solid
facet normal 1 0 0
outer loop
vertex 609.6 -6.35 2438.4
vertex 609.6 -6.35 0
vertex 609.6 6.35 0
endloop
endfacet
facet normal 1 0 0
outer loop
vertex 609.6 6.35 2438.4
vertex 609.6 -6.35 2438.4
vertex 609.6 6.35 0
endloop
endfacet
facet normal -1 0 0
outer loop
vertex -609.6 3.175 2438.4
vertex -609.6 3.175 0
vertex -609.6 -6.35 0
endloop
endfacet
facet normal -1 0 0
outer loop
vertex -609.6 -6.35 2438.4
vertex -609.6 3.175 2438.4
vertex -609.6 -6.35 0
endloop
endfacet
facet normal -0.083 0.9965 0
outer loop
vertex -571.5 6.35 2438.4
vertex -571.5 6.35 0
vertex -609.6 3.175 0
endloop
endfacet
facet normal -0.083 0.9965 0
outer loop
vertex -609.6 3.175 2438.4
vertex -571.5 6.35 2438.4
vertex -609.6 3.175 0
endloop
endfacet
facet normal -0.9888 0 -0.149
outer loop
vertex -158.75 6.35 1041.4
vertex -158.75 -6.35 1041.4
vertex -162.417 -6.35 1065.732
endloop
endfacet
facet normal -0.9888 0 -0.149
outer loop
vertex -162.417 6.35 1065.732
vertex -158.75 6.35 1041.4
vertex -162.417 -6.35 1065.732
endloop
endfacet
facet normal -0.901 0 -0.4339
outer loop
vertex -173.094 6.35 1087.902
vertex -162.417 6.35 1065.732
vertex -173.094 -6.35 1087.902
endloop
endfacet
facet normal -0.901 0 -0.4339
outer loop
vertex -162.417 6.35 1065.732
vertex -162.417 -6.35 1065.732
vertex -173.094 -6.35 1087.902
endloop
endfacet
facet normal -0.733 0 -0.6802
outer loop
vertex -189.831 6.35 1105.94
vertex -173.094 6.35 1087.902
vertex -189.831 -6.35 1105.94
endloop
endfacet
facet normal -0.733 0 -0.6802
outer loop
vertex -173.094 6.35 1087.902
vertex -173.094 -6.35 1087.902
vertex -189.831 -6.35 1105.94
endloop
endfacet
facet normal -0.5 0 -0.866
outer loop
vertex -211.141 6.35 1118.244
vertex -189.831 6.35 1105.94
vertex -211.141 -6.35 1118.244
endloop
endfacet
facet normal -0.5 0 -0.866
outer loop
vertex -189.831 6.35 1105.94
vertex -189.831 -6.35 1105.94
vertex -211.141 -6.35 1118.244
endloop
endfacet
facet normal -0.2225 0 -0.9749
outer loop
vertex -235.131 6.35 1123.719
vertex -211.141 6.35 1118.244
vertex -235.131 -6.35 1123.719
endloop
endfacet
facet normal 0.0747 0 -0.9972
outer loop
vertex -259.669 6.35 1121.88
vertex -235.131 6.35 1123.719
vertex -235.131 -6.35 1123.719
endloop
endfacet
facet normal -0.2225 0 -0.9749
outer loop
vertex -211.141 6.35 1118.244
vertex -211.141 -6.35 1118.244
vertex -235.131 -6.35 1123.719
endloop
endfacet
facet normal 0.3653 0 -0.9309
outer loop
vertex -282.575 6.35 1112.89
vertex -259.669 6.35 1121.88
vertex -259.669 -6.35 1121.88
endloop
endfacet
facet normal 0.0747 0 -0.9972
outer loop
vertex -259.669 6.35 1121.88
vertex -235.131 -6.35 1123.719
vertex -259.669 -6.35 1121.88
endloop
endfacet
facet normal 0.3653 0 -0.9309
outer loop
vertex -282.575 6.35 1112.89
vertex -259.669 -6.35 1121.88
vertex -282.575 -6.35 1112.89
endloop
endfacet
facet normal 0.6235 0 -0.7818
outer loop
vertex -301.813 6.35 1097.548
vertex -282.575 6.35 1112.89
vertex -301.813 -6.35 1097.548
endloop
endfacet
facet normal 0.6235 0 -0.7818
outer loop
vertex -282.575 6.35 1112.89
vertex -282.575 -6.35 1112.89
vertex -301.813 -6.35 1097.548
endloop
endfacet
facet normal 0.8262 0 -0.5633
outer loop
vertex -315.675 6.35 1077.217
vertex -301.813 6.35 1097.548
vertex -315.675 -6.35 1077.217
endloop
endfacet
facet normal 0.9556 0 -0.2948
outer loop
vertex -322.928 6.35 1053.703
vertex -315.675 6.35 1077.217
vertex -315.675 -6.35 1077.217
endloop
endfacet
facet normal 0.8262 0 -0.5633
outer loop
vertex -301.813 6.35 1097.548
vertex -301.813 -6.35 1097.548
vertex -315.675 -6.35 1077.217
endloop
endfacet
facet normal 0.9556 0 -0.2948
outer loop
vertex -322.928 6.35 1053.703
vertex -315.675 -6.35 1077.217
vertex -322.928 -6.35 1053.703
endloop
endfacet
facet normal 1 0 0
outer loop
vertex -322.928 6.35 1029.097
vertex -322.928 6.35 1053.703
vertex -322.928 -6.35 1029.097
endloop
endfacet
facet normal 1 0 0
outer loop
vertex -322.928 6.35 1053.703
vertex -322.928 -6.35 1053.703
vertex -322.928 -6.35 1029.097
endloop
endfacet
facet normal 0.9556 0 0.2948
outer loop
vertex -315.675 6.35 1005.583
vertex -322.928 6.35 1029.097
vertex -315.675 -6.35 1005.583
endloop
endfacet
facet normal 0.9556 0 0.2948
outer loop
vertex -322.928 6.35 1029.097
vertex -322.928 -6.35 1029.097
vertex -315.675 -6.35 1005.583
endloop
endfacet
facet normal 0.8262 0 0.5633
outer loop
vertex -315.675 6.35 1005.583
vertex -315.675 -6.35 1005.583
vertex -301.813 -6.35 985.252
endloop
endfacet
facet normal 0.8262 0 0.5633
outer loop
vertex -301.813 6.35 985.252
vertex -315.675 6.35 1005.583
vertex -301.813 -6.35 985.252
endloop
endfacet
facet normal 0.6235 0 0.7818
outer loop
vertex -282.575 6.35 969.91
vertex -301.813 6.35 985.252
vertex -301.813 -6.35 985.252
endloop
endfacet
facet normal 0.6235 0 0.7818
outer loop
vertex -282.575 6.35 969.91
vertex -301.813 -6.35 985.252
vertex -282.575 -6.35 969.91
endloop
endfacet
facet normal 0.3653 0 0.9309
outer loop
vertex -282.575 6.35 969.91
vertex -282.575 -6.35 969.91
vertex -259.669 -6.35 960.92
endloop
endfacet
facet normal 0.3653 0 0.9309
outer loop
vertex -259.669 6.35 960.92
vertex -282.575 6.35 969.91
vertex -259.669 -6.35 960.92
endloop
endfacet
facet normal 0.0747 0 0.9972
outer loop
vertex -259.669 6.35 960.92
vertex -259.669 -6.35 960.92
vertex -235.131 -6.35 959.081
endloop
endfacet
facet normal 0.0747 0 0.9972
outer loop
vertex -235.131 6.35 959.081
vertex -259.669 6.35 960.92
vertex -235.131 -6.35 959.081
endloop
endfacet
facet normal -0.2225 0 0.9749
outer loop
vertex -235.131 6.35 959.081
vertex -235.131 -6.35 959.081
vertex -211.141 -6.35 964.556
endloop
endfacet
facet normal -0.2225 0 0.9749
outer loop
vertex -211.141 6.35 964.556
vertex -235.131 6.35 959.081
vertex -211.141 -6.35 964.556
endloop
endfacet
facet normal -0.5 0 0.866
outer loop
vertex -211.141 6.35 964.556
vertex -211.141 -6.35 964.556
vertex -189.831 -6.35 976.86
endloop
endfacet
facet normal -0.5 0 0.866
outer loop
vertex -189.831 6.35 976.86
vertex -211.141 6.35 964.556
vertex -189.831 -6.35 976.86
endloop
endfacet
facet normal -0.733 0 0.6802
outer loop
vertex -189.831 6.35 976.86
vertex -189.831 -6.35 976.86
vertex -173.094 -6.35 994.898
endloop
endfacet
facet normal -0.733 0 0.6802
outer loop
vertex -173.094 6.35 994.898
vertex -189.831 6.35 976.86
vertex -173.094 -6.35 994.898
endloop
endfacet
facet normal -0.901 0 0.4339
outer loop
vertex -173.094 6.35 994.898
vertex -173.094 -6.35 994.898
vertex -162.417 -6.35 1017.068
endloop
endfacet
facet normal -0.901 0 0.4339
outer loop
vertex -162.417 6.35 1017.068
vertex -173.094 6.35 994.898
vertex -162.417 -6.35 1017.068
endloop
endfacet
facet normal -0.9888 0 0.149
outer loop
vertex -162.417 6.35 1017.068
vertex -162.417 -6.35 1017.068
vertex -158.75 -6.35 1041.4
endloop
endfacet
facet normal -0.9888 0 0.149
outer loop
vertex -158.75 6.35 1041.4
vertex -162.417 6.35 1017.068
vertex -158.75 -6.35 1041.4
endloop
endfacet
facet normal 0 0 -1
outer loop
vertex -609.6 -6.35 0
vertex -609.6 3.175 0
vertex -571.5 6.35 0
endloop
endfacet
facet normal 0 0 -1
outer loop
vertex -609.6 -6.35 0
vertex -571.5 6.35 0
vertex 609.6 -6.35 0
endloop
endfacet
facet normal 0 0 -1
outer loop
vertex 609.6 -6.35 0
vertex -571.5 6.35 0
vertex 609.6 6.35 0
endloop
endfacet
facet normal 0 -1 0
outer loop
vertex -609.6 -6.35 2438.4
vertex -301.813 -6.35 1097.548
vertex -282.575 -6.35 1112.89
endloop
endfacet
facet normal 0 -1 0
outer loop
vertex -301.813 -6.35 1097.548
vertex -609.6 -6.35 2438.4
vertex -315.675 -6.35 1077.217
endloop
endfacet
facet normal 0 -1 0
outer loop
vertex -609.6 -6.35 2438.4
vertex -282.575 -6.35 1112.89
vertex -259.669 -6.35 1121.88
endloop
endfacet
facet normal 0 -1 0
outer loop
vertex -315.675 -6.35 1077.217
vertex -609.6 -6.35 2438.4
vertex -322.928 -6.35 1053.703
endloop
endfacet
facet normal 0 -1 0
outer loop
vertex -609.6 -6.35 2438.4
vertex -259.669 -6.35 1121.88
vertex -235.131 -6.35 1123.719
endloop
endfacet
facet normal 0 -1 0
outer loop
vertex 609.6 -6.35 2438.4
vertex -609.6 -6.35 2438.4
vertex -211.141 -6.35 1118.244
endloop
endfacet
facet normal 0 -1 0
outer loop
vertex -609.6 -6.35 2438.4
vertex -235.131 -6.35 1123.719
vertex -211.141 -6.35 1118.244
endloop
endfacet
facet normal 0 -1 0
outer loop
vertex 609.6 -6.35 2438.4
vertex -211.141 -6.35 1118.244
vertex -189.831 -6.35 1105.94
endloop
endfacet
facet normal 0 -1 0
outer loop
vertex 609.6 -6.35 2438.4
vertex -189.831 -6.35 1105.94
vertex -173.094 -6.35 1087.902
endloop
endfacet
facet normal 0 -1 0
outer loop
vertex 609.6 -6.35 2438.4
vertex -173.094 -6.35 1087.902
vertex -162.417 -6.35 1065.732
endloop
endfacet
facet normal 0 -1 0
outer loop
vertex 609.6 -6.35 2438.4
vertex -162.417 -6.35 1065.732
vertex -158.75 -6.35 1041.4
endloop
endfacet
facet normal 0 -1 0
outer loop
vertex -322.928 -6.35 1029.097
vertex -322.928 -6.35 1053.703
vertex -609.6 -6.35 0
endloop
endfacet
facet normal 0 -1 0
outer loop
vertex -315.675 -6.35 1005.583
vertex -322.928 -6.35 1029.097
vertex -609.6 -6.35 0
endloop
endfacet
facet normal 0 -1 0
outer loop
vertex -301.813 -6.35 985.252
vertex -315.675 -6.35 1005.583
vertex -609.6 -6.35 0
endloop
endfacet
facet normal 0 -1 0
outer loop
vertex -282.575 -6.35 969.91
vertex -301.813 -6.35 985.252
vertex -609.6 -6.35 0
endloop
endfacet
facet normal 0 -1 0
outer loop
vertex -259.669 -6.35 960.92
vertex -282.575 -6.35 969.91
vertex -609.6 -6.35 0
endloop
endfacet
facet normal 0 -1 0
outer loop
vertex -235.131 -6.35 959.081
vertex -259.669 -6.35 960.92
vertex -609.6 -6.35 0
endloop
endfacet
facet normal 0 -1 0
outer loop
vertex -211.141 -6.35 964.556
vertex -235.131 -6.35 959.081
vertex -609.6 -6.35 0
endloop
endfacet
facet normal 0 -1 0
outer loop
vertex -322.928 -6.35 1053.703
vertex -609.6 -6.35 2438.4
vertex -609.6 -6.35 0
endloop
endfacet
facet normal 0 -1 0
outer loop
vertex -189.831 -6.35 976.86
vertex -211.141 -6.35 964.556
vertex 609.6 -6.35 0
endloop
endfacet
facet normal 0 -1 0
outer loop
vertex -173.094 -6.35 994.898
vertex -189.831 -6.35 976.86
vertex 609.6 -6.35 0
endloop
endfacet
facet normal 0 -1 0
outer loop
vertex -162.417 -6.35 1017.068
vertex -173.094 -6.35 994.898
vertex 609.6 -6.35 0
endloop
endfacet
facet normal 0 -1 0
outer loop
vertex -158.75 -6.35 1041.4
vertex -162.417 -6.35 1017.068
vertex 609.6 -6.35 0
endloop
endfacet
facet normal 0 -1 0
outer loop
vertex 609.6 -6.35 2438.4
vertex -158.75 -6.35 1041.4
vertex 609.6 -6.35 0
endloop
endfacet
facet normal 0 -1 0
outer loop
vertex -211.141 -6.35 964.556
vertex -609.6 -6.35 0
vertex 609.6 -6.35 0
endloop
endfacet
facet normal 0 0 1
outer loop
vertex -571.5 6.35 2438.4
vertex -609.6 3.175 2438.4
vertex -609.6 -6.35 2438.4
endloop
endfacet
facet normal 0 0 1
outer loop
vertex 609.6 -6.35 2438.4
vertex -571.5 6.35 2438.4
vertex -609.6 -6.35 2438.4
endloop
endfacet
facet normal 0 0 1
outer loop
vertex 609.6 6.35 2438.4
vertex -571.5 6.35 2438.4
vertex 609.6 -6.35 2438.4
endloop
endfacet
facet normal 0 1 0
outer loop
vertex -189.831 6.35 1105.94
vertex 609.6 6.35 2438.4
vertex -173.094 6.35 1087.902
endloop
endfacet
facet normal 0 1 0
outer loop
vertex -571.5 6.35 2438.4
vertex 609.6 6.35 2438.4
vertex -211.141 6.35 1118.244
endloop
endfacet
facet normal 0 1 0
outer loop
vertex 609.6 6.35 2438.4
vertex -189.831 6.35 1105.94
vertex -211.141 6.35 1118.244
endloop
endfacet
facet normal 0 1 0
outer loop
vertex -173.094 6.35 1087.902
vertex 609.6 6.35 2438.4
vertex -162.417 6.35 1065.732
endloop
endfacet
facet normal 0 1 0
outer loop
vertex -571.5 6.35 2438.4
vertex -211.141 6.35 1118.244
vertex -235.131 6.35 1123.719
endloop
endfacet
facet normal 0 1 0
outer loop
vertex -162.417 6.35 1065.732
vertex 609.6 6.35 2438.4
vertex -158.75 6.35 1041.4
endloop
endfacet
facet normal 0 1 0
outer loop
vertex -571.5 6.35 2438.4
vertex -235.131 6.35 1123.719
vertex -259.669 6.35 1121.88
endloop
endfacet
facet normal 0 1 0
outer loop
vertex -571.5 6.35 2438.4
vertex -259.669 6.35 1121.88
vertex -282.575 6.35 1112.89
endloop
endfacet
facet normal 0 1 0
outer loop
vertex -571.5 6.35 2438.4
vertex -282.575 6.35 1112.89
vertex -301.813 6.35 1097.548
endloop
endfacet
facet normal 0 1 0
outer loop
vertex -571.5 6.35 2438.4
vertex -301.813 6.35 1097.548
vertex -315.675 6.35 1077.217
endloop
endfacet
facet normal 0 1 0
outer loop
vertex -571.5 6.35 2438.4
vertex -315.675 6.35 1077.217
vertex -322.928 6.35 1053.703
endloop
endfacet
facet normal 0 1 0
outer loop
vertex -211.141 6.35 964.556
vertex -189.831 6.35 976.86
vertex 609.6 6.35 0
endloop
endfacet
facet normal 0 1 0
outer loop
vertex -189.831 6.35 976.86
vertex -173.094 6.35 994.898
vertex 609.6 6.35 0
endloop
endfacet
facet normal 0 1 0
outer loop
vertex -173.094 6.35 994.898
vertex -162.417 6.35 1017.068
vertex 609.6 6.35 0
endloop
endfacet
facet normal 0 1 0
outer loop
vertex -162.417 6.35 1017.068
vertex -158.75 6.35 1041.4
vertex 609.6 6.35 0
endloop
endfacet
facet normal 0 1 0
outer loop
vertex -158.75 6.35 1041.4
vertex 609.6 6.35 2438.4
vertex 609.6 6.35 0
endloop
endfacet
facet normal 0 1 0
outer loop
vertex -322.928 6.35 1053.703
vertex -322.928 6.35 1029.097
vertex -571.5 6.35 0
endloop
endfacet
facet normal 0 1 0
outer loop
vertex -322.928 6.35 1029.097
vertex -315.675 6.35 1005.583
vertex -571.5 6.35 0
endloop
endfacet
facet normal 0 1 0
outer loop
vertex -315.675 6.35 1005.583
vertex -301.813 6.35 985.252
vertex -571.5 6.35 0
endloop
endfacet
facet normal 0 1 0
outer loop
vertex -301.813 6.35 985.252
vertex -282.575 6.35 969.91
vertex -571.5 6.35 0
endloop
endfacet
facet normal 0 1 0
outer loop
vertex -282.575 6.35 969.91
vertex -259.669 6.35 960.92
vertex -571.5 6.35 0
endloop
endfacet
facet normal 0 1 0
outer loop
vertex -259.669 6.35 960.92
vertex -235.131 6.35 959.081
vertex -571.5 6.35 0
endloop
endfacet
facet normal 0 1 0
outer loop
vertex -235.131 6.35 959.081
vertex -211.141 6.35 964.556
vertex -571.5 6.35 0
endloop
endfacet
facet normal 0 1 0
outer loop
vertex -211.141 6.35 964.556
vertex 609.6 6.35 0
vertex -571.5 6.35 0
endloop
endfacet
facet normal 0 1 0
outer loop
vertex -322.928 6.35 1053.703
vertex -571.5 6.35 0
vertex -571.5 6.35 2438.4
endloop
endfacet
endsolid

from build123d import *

# Parameters (mm, degrees)
F1_DEPTH = 2438.4
F2_R     = 82.55
F3_DEPTH = 25.4


with BuildPart() as f1:
    # F0 (on Top) → F1 (new body)
    with BuildSketch(Plane.XY):
        Polygon((-609.6, 3.175), (-609.6, -6.35), (609.6, -6.35), (609.6, 6.35), (-571.5, 6.35), align=None)
    extrude(amount=F1_DEPTH)

    # F2 (on face) → F3 (cut)
    with BuildSketch(Plane.XZ.offset(6.35)):
        with Locations((-241.3, 1041.4)):
            Circle(F2_R)
    extrude(amount=-F3_DEPTH, mode=Mode.SUBTRACT)


solid = f1.part
